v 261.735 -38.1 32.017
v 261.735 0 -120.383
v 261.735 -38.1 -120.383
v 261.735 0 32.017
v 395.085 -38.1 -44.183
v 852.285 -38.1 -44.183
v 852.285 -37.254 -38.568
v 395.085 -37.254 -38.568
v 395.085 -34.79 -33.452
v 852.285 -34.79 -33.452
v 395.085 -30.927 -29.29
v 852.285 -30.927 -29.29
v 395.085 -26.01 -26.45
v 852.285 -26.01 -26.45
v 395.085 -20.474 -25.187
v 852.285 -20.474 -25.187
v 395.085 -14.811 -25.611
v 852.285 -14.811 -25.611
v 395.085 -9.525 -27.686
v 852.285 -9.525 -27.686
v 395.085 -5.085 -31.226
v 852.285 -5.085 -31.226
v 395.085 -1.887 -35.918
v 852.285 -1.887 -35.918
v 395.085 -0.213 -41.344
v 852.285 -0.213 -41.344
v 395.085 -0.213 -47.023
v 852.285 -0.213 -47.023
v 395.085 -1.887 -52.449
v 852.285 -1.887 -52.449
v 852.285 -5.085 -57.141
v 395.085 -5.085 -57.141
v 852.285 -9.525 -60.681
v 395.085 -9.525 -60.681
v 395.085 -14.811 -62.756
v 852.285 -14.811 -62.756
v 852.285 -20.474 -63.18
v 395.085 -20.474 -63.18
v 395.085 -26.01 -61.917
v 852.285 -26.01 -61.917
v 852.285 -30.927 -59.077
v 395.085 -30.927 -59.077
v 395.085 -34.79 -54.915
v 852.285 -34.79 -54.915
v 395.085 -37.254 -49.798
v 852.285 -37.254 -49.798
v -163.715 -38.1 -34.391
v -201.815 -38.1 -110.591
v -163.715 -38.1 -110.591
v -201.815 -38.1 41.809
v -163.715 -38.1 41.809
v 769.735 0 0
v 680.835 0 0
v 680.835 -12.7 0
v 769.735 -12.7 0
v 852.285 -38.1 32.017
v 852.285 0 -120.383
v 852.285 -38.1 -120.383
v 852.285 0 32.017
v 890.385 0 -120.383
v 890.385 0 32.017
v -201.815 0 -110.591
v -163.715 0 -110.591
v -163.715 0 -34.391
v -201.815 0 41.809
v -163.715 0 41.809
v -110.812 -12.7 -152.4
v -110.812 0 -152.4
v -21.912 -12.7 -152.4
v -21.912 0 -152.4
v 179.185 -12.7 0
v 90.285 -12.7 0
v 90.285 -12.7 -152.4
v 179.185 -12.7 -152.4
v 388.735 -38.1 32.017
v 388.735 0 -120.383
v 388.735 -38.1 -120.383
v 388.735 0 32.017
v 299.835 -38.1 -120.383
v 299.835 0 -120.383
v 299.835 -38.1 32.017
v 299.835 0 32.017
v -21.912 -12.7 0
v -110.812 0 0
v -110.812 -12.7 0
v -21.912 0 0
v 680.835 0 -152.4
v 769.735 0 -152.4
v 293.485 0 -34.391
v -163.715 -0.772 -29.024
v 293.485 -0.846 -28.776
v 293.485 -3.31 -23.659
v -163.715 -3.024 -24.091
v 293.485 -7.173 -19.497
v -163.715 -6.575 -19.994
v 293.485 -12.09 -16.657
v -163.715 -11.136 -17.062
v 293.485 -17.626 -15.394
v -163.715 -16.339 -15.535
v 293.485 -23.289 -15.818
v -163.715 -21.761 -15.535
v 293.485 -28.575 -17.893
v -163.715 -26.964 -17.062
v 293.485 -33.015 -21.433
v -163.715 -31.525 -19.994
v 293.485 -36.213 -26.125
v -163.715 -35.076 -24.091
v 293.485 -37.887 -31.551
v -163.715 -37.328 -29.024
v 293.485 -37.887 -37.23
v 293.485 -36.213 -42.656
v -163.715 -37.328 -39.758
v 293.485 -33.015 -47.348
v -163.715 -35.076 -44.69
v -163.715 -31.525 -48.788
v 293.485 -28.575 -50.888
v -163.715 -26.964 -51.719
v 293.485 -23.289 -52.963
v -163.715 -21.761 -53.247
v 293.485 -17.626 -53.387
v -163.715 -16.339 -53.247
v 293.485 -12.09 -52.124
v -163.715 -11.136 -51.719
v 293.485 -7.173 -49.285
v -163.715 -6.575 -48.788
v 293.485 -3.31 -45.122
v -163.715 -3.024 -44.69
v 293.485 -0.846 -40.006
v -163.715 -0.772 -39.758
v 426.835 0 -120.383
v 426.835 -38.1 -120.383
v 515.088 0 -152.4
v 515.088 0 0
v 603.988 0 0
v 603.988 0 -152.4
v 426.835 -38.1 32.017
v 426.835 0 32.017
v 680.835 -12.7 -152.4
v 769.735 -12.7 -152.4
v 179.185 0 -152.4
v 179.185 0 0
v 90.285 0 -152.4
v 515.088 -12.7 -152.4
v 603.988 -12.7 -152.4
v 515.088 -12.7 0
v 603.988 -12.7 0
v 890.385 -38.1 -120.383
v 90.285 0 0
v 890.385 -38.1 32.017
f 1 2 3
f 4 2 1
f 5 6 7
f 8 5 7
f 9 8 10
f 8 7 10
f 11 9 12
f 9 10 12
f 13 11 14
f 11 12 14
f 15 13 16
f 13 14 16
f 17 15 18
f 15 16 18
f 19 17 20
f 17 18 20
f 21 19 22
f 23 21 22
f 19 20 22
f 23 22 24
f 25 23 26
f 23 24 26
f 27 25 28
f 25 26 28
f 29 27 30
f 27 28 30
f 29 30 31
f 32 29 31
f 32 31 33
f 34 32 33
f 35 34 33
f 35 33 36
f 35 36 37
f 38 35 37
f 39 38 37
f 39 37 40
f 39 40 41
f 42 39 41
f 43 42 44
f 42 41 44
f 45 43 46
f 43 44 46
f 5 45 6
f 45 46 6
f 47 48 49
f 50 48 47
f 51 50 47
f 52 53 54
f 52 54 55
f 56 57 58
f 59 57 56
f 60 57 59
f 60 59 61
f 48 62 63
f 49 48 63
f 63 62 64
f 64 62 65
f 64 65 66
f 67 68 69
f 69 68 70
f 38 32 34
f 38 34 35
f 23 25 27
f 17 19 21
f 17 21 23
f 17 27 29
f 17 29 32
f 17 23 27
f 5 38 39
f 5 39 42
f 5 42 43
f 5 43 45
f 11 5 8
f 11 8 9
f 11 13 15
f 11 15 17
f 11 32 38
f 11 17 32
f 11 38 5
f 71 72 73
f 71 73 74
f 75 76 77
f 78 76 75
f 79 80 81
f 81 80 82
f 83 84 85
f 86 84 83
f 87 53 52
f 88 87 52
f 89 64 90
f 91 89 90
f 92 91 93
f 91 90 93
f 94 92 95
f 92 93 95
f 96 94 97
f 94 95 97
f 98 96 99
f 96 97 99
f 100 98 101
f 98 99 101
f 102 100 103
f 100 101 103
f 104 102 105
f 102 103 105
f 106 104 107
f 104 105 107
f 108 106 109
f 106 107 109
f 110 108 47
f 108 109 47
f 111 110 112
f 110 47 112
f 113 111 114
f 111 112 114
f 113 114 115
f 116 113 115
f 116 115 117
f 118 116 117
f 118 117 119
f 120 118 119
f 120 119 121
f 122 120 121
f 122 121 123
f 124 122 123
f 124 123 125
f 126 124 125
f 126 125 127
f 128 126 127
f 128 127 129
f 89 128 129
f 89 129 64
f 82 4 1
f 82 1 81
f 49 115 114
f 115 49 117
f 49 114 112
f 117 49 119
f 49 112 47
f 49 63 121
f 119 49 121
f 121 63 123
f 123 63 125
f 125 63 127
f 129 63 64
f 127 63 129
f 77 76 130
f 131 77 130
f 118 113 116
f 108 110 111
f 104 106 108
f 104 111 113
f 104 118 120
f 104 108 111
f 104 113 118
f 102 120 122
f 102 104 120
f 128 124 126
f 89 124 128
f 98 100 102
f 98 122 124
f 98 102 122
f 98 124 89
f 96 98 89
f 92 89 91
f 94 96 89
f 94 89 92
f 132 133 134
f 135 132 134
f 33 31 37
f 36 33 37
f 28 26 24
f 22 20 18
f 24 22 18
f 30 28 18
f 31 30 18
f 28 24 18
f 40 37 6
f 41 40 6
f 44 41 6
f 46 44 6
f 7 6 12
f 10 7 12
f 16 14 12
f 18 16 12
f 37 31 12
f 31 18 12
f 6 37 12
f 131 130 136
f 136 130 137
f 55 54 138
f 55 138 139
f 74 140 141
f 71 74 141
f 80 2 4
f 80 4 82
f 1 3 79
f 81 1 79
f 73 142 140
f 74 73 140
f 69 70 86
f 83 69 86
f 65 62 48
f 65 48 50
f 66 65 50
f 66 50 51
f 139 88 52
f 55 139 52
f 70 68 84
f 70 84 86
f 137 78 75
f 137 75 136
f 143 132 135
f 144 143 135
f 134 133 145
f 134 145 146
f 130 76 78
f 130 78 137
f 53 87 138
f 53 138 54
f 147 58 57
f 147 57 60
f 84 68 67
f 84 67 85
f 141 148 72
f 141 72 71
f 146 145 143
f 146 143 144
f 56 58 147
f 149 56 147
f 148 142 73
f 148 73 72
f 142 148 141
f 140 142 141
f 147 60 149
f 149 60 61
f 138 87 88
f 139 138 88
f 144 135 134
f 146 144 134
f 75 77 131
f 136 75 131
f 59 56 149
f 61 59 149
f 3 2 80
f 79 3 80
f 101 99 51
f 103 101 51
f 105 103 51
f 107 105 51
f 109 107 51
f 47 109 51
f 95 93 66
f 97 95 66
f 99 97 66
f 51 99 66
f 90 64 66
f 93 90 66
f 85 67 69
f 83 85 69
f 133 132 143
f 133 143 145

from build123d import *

# Parameters (mm, degrees)
F0_W     = 38.1
F0_H     = 152.4
F1_DEPTH = 38.1
F3_DEPTH = 457.2
F4_R     = 19.05
F5_DEPTH = 457.2
F6_W     = 88.9
F6_H     = 152.4
F7_DEPTH = 12.7


with BuildPart() as f1:
    # F0 (on Front) → F1 (new body)
    with BuildSketch(Plane.XZ):
        with Locations((-182.7645437746, -34.3906155205)):
            Rectangle(F0_W, F0_H)
    extrude(amount=F1_DEPTH)

    # F2 (on face) → F3 (join)
    with BuildSketch(Plane.YZ.offset(-163.7145437746)):
        with BuildLine():
            ThreePointArc((-38.1, -34.3906155205), (-19.05, -53.4406155205), (0, -34.3906155205))
            ThreePointArc((0, -34.3906155205), (-19.05, -15.3406155205), (-38.1, -34.3906155205))
        make_face()
    extrude(amount=F3_DEPTH)


with BuildPart() as f1b:
    # F0 (on Front) → F1, piece 2 (new body)
    with BuildSketch(Plane.XZ):
        with Locations((280.7854562254, -44.1833949373)):
            Rectangle(F0_W, F0_H)
    extrude(amount=F1_DEPTH)


with BuildPart() as f1c:
    # F0 (on Front) → F1, piece 3 (new body)
    with BuildSketch(Plane.XZ):
        with Locations((407.7854562254, -44.1833949373)):
            Rectangle(F0_W, F0_H)
    extrude(amount=F1_DEPTH)


with BuildPart() as f1d:
    # F0 (on Front) → F1, piece 4 (new body)
    with BuildSketch(Plane.XZ):
        with Locations((871.3354562254, -44.1833949373)):
            Rectangle(F0_W, F0_H)
    extrude(amount=F1_DEPTH)


with BuildPart() as f5:
    # F4 (on face) → F5 (new body)
    with BuildSketch(Plane(origin=(852.2854562254, 0, 0), x_dir=(0, -1, 0), z_dir=(-1, 0, 0))):
        with Locations((19.05, -44.1833949373)):
            Circle(F4_R)
    extrude(amount=F5_DEPTH)


with BuildPart() as f7:
    # F6 (on Front) → F7 (new body)
    with BuildSketch(Plane.XZ):
        with Locations((134.7354562254, -76.2)):
            Rectangle(F6_W, F6_H)
    extrude(amount=F7_DEPTH)


with BuildPart() as f7b:
    # F6 (on Front) → F7, piece 2 (new body)
    with BuildSketch(Plane.XZ):
        with Locations((725.2854562254, -76.2)):
            Rectangle(F6_W, F6_H)
    extrude(amount=F7_DEPTH)


with BuildPart() as f7c:
    # F6 (on Front) → F7, piece 3 (new body)
    with BuildSketch(Plane.XZ):
        with Locations((559.5377833366, -76.2)):
            Rectangle(F6_W, F6_H)
    extrude(amount=F7_DEPTH)


with BuildPart() as f7d:
    # F6 (on Front) → F7, piece 4 (new body)
    with BuildSketch(Plane.XZ):
        with Locations((-66.3621499419, -76.2)):
            Rectangle(F6_W, F6_H)
    extrude(amount=F7_DEPTH)


solid = Compound([f1.part, f1b.part, f1c.part, f1d.part, f5.part, f7.part, f7b.part, f7c.part, f7d.part])
